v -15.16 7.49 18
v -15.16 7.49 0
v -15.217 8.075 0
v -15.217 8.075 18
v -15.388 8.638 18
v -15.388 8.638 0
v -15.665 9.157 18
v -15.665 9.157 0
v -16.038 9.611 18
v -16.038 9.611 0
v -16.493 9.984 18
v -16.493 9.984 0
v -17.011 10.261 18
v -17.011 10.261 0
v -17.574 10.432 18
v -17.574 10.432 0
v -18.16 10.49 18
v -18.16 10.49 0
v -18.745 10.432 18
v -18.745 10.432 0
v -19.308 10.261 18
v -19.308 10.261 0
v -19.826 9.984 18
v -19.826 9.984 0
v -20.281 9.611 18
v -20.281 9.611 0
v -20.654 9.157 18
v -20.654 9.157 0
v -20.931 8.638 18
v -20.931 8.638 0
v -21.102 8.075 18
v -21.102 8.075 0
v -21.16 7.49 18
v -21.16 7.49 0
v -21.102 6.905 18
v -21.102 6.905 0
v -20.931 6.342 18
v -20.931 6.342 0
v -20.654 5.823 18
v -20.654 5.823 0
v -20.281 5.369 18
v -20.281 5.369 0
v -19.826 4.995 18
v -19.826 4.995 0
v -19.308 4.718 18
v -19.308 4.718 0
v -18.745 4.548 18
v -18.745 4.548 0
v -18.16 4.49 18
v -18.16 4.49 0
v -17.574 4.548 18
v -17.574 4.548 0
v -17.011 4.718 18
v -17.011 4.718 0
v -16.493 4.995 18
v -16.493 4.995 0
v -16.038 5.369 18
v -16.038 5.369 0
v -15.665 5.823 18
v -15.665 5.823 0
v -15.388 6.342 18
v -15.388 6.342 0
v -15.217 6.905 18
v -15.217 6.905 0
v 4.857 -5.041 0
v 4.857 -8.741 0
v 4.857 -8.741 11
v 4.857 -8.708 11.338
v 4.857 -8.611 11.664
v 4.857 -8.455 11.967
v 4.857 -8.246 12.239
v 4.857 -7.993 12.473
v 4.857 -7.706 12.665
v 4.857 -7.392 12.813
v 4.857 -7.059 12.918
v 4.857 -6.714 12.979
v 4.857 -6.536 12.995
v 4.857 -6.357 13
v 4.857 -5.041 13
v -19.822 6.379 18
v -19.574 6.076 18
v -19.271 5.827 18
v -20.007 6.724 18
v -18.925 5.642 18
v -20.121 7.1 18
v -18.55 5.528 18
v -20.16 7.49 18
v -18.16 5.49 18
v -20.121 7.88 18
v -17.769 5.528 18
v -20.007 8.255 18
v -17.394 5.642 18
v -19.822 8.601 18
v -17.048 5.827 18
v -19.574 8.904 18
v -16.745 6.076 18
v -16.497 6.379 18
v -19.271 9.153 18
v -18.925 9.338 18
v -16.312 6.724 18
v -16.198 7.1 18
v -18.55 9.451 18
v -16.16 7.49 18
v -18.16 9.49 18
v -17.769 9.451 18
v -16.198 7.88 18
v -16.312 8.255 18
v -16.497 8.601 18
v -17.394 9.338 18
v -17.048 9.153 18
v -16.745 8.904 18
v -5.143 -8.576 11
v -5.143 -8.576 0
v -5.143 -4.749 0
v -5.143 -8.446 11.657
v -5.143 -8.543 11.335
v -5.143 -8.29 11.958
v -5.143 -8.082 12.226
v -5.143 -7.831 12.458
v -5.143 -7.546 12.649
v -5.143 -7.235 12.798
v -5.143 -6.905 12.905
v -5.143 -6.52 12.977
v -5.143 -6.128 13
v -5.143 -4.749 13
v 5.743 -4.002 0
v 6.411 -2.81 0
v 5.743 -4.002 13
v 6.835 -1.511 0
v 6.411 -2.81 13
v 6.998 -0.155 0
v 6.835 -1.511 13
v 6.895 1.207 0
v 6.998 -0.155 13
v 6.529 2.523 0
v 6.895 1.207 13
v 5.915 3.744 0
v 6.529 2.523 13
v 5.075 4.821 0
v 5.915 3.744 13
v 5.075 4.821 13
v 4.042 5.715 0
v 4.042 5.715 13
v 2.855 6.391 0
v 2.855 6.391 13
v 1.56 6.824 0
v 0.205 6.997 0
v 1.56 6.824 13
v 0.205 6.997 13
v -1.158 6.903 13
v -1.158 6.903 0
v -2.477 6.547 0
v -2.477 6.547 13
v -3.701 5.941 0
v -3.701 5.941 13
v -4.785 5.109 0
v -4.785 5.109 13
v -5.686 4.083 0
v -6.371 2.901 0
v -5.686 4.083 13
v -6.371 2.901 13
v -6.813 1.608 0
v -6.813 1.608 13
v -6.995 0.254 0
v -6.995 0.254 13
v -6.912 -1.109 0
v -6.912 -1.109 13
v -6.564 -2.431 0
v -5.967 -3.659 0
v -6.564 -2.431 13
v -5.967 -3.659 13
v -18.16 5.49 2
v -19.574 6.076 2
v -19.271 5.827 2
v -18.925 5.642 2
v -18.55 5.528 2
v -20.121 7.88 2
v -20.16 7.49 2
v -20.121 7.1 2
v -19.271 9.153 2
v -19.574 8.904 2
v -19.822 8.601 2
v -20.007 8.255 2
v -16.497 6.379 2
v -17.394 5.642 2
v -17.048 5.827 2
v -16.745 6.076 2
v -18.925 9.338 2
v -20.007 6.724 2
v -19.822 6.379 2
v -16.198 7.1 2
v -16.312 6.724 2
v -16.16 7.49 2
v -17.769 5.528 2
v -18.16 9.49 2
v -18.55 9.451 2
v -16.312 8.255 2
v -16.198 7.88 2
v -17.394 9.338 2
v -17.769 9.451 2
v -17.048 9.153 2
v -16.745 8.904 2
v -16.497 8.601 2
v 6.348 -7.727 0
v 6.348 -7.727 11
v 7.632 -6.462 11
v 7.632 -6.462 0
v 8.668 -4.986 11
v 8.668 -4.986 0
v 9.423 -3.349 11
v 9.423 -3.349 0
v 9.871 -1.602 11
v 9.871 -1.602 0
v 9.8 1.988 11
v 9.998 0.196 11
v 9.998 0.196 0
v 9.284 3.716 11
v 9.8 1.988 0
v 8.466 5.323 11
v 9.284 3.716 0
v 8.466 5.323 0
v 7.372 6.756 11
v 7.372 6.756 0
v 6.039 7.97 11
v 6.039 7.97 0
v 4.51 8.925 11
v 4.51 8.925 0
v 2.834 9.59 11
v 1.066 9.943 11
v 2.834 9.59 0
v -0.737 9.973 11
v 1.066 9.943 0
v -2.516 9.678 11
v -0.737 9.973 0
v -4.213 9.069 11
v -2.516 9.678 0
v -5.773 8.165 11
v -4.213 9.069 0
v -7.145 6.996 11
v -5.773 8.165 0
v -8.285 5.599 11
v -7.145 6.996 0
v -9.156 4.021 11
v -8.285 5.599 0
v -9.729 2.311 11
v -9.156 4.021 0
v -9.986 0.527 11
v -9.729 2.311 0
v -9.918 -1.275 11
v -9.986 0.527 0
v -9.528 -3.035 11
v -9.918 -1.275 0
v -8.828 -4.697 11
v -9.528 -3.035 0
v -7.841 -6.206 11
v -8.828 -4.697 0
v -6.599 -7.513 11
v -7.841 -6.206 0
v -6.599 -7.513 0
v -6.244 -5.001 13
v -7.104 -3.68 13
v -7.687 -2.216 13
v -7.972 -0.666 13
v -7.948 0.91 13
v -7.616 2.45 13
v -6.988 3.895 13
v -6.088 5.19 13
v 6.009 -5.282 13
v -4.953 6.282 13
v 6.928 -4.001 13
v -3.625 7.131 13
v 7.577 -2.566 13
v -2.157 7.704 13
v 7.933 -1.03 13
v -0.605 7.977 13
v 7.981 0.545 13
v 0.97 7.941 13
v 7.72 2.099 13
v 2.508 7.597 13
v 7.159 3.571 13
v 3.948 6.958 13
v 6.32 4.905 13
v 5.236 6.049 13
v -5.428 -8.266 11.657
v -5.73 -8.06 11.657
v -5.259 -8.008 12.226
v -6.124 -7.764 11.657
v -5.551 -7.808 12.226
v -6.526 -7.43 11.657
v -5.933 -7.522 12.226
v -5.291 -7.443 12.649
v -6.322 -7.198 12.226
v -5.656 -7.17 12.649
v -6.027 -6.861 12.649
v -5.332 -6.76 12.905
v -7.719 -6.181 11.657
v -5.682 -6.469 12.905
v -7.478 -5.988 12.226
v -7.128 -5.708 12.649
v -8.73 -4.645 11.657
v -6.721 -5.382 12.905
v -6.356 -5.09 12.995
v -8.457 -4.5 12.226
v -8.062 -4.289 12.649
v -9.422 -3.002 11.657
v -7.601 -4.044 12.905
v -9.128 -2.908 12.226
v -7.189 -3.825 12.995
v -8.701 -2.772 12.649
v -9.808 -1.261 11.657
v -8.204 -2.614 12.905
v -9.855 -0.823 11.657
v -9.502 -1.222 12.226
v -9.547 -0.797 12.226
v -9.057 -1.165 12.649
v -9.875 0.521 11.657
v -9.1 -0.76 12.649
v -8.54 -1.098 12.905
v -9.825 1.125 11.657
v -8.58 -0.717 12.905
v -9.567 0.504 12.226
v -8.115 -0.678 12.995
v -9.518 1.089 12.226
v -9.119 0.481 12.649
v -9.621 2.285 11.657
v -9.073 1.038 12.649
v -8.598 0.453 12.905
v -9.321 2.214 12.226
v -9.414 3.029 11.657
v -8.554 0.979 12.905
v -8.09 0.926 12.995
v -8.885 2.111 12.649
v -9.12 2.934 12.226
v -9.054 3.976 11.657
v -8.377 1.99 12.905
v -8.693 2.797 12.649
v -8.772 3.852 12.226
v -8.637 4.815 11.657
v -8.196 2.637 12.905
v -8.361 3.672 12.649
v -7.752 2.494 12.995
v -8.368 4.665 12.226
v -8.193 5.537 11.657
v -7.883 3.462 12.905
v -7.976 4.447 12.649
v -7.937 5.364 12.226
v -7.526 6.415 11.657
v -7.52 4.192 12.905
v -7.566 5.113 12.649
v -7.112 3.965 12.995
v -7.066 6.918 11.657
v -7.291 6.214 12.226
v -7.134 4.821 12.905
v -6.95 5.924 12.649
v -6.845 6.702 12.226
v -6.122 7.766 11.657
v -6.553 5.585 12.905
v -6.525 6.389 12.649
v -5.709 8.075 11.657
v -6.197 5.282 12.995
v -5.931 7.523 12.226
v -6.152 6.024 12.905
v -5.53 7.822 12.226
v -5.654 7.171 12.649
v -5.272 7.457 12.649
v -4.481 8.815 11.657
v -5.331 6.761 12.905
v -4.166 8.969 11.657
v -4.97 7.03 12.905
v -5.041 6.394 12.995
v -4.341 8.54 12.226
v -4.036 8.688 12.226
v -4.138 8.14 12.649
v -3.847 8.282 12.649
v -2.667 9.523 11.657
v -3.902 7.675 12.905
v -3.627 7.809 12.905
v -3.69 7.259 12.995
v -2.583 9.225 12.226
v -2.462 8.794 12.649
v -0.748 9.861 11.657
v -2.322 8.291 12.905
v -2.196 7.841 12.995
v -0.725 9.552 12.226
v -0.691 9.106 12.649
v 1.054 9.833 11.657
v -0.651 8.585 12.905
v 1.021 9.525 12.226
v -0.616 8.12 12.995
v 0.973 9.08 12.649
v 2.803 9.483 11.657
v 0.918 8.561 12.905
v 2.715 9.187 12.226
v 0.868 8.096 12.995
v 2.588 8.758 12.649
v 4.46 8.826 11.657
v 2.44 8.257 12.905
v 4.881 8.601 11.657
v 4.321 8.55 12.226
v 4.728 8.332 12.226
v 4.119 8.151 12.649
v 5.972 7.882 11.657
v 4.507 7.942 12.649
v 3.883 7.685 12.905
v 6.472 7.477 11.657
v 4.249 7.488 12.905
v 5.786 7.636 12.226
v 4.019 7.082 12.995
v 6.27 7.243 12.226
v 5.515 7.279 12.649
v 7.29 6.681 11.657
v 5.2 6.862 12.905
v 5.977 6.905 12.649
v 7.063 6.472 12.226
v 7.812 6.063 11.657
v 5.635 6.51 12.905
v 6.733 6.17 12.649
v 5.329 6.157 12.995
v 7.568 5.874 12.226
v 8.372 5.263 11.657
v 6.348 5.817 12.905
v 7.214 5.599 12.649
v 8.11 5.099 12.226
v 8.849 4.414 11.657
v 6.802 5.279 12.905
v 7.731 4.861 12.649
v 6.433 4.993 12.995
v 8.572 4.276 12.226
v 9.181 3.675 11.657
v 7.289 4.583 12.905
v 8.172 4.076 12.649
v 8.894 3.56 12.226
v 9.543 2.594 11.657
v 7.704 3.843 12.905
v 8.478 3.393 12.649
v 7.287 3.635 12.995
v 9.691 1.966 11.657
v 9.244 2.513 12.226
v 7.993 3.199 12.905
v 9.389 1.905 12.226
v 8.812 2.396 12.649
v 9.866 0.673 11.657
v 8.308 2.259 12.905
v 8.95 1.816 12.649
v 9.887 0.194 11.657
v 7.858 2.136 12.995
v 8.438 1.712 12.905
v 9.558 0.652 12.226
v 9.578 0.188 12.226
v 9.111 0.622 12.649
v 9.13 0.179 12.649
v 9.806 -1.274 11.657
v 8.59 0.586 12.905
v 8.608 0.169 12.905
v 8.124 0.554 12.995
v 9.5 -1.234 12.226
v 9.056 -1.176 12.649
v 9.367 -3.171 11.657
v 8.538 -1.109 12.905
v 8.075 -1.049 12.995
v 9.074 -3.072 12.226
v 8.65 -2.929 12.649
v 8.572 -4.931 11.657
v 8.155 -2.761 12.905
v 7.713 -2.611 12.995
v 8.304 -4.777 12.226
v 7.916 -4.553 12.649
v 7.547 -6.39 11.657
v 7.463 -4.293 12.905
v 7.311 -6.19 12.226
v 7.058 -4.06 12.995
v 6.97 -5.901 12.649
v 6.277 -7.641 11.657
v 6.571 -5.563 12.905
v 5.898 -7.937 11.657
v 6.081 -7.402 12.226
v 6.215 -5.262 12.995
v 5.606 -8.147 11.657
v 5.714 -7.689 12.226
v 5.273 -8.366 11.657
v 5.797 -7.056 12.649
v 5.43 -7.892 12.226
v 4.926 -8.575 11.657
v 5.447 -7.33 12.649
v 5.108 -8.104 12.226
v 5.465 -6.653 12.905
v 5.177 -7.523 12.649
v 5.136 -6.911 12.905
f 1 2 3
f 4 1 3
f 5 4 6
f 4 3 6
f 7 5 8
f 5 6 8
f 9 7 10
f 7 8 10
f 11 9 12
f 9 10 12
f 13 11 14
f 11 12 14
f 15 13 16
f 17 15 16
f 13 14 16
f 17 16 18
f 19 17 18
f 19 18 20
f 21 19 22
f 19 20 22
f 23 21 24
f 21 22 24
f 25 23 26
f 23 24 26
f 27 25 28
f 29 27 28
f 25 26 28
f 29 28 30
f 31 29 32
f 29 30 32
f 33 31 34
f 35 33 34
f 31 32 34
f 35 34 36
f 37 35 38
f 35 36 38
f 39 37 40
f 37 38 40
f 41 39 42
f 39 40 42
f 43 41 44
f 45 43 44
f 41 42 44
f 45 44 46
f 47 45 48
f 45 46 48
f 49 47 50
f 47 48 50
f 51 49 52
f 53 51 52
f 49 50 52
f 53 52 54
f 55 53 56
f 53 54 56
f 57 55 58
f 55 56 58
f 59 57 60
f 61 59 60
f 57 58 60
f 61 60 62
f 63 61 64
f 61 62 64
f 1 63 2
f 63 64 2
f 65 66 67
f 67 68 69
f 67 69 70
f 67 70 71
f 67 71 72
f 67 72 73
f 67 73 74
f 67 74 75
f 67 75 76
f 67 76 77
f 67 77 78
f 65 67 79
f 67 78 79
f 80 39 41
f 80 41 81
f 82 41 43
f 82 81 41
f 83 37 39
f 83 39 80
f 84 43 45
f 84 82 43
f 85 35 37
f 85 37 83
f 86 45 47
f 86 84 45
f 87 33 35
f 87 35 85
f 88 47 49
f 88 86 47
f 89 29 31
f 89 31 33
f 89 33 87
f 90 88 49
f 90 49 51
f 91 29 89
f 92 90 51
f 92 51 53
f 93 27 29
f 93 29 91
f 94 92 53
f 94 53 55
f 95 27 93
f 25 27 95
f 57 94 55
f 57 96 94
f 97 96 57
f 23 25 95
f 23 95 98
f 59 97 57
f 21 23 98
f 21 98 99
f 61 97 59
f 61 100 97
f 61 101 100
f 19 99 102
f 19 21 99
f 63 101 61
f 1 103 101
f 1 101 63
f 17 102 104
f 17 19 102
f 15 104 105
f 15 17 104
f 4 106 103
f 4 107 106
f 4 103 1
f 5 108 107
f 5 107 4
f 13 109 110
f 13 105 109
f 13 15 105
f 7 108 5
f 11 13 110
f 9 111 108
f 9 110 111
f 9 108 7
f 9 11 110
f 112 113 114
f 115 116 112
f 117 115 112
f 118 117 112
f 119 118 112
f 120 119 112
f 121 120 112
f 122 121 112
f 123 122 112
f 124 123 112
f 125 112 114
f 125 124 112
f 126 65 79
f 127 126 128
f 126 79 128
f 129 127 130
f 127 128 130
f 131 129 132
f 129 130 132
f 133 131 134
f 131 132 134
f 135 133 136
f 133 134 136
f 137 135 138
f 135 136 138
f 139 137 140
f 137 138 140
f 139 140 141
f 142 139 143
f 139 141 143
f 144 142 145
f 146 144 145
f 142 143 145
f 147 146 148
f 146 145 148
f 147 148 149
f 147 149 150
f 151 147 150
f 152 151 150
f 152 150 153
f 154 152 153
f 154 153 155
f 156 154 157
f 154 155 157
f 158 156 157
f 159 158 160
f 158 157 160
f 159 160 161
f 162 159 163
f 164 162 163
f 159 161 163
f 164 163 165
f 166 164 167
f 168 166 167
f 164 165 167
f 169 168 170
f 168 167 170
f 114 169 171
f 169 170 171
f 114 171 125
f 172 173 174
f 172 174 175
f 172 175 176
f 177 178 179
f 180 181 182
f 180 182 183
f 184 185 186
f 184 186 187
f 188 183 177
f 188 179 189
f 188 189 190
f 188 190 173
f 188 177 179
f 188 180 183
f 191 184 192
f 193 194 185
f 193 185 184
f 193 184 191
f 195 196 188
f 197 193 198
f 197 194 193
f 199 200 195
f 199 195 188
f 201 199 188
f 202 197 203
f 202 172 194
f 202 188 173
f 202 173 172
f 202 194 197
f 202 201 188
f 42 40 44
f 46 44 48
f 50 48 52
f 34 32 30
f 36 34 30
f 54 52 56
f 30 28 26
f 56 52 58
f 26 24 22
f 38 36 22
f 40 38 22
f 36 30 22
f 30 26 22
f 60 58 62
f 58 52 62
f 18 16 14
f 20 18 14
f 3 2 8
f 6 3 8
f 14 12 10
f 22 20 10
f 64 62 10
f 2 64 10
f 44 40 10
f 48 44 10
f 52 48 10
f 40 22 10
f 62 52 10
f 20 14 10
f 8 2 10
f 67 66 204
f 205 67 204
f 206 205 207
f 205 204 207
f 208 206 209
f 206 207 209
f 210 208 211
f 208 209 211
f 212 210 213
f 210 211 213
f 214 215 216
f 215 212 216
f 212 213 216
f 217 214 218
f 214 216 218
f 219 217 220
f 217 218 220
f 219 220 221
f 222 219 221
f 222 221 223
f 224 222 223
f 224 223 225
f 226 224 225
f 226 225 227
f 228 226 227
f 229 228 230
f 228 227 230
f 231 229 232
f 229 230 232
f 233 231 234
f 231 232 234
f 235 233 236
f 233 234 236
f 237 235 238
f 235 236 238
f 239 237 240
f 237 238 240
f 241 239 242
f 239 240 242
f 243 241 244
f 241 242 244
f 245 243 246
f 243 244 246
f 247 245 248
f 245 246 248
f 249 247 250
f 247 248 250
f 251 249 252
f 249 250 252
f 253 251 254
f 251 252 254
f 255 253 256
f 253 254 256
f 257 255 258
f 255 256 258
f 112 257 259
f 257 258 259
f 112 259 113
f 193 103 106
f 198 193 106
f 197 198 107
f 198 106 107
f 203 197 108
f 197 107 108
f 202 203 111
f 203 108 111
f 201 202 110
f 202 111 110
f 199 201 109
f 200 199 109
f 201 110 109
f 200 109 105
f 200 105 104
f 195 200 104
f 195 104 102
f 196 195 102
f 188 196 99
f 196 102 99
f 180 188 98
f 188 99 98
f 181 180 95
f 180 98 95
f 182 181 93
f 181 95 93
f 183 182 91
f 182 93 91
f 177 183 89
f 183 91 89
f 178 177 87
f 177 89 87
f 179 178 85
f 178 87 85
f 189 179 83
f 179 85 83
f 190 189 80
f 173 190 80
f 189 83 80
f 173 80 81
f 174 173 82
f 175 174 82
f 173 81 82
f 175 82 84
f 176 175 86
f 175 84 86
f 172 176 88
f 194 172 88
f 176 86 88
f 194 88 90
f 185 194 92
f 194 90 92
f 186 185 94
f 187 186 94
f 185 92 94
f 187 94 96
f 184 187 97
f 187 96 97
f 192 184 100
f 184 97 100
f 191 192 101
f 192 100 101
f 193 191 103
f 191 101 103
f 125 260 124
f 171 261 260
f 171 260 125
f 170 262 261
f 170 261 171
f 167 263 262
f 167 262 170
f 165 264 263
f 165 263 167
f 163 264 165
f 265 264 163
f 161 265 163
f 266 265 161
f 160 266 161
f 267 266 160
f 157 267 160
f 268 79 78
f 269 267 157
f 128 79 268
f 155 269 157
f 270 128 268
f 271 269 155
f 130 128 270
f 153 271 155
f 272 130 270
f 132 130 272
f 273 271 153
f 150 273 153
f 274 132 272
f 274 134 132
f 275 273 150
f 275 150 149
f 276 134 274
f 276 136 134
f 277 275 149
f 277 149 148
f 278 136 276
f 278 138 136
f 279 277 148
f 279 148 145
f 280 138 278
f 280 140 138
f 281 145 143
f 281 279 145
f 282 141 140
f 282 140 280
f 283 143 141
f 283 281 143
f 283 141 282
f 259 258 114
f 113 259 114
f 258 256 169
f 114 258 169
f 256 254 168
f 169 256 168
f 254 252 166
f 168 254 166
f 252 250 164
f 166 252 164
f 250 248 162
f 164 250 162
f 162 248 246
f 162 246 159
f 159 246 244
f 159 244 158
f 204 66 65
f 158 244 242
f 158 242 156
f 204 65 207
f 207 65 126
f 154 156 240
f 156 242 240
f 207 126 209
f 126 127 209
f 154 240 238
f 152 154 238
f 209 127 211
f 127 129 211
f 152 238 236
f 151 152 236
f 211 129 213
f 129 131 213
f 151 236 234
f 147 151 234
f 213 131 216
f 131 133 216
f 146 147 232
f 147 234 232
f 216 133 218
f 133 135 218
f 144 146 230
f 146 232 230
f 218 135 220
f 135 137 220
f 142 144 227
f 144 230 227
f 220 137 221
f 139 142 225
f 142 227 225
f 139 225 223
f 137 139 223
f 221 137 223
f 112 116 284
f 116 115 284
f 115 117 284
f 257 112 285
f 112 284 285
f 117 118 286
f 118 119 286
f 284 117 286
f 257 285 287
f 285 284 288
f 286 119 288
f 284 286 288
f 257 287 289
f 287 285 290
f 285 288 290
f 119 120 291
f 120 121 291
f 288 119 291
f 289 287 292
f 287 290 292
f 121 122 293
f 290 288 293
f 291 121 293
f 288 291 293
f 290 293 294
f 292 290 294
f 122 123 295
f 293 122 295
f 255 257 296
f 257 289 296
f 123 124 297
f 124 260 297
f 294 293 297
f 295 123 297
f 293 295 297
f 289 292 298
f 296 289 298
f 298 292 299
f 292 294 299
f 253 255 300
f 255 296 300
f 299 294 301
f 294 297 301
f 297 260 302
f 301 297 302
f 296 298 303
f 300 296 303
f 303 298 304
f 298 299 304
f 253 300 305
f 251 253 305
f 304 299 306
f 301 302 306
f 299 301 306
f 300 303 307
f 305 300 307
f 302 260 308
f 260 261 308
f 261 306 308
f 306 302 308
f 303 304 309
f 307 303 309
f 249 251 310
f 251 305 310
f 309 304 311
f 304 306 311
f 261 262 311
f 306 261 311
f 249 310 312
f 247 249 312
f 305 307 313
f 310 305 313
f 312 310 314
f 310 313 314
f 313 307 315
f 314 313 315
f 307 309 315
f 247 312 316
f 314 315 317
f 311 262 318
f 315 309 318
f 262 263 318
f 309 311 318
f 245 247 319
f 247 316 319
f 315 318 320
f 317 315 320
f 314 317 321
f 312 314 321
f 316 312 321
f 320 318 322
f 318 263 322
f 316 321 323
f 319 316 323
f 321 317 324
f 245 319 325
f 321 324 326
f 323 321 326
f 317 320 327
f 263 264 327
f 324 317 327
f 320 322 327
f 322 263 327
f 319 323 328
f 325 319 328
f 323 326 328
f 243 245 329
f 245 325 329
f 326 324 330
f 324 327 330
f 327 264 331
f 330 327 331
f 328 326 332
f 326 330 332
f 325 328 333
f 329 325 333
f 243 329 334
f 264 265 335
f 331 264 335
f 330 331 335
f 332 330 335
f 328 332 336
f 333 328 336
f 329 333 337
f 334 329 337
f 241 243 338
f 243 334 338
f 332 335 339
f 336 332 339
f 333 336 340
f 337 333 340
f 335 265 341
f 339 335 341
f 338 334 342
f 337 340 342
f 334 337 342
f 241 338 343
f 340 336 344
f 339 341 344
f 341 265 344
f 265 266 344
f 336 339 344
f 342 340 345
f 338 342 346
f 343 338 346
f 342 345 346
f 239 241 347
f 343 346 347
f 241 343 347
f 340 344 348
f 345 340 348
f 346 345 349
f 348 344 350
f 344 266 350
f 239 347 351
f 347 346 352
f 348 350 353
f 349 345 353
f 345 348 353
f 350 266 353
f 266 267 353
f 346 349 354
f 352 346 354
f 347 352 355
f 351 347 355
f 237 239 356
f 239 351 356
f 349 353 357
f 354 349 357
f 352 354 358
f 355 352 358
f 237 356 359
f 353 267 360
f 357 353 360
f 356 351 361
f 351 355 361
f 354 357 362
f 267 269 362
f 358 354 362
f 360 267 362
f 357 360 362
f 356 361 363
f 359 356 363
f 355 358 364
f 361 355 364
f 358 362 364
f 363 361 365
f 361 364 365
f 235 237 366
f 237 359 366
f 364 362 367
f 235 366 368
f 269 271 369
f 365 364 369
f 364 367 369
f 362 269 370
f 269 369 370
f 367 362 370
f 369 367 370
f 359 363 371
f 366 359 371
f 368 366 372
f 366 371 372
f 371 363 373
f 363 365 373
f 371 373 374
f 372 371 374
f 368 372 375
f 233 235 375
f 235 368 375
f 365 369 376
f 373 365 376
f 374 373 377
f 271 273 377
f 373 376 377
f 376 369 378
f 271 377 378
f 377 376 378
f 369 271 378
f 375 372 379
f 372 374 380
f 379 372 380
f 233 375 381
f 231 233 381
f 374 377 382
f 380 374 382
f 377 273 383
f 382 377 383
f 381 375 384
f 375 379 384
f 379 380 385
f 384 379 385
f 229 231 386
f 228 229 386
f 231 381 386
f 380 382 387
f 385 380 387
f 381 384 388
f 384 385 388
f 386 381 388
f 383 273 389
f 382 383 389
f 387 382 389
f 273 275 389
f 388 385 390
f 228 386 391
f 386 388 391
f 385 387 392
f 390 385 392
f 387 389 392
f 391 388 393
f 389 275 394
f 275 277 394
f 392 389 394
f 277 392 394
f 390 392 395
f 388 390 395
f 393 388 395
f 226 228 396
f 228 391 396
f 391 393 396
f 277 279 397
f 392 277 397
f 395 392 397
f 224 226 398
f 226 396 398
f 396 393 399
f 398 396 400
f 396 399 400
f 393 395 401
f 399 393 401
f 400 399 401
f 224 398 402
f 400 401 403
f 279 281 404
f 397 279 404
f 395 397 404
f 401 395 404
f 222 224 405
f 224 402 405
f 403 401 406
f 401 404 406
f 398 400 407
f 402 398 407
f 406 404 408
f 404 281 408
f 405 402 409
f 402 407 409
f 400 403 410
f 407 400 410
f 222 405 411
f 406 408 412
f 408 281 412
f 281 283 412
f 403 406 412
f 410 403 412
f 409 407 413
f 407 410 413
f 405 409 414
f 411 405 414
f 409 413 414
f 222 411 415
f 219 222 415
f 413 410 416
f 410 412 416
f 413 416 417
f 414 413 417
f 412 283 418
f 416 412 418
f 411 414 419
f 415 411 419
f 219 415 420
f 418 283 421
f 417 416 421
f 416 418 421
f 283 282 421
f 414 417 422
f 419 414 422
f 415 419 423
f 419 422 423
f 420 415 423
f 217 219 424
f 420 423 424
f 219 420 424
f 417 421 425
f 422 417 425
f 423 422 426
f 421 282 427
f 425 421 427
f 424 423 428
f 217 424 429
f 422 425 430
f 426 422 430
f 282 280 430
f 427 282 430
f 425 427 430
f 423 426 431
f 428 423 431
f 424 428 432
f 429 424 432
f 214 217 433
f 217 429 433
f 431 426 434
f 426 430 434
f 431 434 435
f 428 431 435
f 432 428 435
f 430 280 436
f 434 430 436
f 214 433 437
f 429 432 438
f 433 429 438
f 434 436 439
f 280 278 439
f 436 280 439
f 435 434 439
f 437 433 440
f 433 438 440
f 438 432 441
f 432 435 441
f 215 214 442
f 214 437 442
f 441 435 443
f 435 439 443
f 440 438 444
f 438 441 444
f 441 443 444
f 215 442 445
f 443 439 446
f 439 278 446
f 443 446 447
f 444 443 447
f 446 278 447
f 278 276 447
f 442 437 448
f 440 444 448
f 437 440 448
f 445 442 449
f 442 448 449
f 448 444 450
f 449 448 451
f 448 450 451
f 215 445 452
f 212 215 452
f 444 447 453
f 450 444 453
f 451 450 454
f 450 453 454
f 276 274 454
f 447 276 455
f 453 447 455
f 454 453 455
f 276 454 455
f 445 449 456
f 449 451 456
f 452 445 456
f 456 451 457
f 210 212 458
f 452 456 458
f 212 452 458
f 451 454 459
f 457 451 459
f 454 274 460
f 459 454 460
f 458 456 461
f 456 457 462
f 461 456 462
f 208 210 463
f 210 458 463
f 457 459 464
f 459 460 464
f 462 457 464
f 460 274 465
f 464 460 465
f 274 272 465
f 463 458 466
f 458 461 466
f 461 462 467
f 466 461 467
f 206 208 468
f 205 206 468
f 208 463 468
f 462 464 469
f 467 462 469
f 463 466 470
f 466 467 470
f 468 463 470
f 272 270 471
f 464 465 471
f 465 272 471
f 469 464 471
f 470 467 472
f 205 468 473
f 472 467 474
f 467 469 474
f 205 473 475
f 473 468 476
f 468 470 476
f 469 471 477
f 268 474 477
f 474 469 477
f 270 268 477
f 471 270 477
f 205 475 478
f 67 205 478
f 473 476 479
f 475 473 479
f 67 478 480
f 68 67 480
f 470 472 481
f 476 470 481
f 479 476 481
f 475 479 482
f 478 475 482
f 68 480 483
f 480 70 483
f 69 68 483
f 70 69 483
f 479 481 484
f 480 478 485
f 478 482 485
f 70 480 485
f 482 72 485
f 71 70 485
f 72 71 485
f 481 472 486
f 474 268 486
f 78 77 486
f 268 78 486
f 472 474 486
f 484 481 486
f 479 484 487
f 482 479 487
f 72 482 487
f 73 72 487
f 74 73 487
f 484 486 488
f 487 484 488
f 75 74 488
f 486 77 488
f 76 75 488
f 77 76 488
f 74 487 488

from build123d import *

# Parameters (mm, degrees)
F0_R     = 10
F1_DEPTH = 13
F2_R     = 7
F3_DEPTH = 13
F4_W     = 10
F4_H     = 13
F5_DEPTH = 13
F6_R     = 3
F7_DEPTH = 18
F8_R     = 2
F9_DEPTH = 16
F10_R    = 2


with BuildPart() as f1:
    # F0 (on Top) → F1 (new body)
    with BuildSketch(Plane.XY):
        Circle(F0_R)
    extrude(amount=F1_DEPTH)

    # F2 (on face) → F3 (cut)
    with BuildSketch(Plane.XY.offset(13)):
        Circle(F2_R)
    extrude(amount=-F3_DEPTH, mode=Mode.SUBTRACT)

    # F4 (on face) → F5 (cut)
    with BuildSketch(Plane.XY.offset(13)):
        with Locations((-0.143068, -8.742115)):
            Rectangle(F4_W, F4_H)
    extrude(amount=-F5_DEPTH, mode=Mode.SUBTRACT)

    # F10
    f10_edges = [f1.edges().sort_by_distance(p)[0] for p in [
        (0.165208, 9.998635, 13),
    ]]
    fillet(f10_edges, radius=F10_R)


with BuildPart() as f7:
    # F6 (on Top) → F7 (new body)
    with BuildSketch(Plane.XY):
        with Locations((-18.15955, 7.48986)):
            Circle(F6_R)
    extrude(amount=F7_DEPTH)

    # F8 (on face) → F9 (cut)
    with BuildSketch(Plane.XY.offset(18)):
        with Locations((-18.15955, 7.48986)):
            Circle(F8_R)
    extrude(amount=-F9_DEPTH, mode=Mode.SUBTRACT)


solid = Compound([f1.part, f7.part])
